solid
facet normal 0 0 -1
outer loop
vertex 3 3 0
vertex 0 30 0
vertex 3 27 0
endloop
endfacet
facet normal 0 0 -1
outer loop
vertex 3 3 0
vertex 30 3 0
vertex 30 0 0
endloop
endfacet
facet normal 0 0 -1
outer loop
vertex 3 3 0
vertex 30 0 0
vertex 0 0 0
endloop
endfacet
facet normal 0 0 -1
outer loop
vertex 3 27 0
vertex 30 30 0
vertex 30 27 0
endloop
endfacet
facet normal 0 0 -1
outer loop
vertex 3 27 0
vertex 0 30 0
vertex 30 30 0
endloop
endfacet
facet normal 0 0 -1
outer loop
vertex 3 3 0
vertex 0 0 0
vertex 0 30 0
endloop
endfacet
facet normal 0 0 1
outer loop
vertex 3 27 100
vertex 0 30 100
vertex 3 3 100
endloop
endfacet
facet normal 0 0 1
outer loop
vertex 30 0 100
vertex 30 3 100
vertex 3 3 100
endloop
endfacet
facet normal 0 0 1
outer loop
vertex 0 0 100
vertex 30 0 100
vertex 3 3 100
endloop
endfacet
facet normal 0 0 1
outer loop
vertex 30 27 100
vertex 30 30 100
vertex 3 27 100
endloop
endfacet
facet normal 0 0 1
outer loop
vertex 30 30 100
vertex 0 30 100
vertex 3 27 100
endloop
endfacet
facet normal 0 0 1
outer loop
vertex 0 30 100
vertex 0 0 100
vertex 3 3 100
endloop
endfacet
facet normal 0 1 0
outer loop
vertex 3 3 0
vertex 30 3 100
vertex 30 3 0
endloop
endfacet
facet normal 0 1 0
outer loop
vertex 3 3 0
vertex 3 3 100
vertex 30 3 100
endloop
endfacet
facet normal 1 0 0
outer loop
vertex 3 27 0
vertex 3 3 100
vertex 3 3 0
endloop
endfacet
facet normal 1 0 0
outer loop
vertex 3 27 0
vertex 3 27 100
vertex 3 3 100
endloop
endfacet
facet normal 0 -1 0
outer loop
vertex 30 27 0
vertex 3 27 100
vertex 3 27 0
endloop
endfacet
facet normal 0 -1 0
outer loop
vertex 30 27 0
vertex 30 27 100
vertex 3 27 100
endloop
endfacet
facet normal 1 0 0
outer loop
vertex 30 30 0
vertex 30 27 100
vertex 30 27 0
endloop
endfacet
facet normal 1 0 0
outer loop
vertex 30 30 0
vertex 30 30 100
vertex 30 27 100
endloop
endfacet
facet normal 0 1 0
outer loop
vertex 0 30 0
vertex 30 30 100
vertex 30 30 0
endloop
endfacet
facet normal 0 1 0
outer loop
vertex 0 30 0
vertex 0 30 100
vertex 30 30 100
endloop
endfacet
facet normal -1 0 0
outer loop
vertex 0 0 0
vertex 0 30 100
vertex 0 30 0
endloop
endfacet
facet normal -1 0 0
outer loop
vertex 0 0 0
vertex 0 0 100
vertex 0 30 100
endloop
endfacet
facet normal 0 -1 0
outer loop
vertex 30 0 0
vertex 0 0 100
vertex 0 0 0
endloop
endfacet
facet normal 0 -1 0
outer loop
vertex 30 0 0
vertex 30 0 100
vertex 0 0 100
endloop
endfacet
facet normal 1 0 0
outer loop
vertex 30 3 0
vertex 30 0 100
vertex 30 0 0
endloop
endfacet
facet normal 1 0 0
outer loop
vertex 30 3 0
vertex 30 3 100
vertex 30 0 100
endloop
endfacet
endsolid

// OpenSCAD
color("#CCCCCC"){

linear_extrude(height = 100){
polygon(points =[[0,0],[30,0],[30,3],[3,3],[3,27],[30,27],[30,30],[0,30]]);
}


}
